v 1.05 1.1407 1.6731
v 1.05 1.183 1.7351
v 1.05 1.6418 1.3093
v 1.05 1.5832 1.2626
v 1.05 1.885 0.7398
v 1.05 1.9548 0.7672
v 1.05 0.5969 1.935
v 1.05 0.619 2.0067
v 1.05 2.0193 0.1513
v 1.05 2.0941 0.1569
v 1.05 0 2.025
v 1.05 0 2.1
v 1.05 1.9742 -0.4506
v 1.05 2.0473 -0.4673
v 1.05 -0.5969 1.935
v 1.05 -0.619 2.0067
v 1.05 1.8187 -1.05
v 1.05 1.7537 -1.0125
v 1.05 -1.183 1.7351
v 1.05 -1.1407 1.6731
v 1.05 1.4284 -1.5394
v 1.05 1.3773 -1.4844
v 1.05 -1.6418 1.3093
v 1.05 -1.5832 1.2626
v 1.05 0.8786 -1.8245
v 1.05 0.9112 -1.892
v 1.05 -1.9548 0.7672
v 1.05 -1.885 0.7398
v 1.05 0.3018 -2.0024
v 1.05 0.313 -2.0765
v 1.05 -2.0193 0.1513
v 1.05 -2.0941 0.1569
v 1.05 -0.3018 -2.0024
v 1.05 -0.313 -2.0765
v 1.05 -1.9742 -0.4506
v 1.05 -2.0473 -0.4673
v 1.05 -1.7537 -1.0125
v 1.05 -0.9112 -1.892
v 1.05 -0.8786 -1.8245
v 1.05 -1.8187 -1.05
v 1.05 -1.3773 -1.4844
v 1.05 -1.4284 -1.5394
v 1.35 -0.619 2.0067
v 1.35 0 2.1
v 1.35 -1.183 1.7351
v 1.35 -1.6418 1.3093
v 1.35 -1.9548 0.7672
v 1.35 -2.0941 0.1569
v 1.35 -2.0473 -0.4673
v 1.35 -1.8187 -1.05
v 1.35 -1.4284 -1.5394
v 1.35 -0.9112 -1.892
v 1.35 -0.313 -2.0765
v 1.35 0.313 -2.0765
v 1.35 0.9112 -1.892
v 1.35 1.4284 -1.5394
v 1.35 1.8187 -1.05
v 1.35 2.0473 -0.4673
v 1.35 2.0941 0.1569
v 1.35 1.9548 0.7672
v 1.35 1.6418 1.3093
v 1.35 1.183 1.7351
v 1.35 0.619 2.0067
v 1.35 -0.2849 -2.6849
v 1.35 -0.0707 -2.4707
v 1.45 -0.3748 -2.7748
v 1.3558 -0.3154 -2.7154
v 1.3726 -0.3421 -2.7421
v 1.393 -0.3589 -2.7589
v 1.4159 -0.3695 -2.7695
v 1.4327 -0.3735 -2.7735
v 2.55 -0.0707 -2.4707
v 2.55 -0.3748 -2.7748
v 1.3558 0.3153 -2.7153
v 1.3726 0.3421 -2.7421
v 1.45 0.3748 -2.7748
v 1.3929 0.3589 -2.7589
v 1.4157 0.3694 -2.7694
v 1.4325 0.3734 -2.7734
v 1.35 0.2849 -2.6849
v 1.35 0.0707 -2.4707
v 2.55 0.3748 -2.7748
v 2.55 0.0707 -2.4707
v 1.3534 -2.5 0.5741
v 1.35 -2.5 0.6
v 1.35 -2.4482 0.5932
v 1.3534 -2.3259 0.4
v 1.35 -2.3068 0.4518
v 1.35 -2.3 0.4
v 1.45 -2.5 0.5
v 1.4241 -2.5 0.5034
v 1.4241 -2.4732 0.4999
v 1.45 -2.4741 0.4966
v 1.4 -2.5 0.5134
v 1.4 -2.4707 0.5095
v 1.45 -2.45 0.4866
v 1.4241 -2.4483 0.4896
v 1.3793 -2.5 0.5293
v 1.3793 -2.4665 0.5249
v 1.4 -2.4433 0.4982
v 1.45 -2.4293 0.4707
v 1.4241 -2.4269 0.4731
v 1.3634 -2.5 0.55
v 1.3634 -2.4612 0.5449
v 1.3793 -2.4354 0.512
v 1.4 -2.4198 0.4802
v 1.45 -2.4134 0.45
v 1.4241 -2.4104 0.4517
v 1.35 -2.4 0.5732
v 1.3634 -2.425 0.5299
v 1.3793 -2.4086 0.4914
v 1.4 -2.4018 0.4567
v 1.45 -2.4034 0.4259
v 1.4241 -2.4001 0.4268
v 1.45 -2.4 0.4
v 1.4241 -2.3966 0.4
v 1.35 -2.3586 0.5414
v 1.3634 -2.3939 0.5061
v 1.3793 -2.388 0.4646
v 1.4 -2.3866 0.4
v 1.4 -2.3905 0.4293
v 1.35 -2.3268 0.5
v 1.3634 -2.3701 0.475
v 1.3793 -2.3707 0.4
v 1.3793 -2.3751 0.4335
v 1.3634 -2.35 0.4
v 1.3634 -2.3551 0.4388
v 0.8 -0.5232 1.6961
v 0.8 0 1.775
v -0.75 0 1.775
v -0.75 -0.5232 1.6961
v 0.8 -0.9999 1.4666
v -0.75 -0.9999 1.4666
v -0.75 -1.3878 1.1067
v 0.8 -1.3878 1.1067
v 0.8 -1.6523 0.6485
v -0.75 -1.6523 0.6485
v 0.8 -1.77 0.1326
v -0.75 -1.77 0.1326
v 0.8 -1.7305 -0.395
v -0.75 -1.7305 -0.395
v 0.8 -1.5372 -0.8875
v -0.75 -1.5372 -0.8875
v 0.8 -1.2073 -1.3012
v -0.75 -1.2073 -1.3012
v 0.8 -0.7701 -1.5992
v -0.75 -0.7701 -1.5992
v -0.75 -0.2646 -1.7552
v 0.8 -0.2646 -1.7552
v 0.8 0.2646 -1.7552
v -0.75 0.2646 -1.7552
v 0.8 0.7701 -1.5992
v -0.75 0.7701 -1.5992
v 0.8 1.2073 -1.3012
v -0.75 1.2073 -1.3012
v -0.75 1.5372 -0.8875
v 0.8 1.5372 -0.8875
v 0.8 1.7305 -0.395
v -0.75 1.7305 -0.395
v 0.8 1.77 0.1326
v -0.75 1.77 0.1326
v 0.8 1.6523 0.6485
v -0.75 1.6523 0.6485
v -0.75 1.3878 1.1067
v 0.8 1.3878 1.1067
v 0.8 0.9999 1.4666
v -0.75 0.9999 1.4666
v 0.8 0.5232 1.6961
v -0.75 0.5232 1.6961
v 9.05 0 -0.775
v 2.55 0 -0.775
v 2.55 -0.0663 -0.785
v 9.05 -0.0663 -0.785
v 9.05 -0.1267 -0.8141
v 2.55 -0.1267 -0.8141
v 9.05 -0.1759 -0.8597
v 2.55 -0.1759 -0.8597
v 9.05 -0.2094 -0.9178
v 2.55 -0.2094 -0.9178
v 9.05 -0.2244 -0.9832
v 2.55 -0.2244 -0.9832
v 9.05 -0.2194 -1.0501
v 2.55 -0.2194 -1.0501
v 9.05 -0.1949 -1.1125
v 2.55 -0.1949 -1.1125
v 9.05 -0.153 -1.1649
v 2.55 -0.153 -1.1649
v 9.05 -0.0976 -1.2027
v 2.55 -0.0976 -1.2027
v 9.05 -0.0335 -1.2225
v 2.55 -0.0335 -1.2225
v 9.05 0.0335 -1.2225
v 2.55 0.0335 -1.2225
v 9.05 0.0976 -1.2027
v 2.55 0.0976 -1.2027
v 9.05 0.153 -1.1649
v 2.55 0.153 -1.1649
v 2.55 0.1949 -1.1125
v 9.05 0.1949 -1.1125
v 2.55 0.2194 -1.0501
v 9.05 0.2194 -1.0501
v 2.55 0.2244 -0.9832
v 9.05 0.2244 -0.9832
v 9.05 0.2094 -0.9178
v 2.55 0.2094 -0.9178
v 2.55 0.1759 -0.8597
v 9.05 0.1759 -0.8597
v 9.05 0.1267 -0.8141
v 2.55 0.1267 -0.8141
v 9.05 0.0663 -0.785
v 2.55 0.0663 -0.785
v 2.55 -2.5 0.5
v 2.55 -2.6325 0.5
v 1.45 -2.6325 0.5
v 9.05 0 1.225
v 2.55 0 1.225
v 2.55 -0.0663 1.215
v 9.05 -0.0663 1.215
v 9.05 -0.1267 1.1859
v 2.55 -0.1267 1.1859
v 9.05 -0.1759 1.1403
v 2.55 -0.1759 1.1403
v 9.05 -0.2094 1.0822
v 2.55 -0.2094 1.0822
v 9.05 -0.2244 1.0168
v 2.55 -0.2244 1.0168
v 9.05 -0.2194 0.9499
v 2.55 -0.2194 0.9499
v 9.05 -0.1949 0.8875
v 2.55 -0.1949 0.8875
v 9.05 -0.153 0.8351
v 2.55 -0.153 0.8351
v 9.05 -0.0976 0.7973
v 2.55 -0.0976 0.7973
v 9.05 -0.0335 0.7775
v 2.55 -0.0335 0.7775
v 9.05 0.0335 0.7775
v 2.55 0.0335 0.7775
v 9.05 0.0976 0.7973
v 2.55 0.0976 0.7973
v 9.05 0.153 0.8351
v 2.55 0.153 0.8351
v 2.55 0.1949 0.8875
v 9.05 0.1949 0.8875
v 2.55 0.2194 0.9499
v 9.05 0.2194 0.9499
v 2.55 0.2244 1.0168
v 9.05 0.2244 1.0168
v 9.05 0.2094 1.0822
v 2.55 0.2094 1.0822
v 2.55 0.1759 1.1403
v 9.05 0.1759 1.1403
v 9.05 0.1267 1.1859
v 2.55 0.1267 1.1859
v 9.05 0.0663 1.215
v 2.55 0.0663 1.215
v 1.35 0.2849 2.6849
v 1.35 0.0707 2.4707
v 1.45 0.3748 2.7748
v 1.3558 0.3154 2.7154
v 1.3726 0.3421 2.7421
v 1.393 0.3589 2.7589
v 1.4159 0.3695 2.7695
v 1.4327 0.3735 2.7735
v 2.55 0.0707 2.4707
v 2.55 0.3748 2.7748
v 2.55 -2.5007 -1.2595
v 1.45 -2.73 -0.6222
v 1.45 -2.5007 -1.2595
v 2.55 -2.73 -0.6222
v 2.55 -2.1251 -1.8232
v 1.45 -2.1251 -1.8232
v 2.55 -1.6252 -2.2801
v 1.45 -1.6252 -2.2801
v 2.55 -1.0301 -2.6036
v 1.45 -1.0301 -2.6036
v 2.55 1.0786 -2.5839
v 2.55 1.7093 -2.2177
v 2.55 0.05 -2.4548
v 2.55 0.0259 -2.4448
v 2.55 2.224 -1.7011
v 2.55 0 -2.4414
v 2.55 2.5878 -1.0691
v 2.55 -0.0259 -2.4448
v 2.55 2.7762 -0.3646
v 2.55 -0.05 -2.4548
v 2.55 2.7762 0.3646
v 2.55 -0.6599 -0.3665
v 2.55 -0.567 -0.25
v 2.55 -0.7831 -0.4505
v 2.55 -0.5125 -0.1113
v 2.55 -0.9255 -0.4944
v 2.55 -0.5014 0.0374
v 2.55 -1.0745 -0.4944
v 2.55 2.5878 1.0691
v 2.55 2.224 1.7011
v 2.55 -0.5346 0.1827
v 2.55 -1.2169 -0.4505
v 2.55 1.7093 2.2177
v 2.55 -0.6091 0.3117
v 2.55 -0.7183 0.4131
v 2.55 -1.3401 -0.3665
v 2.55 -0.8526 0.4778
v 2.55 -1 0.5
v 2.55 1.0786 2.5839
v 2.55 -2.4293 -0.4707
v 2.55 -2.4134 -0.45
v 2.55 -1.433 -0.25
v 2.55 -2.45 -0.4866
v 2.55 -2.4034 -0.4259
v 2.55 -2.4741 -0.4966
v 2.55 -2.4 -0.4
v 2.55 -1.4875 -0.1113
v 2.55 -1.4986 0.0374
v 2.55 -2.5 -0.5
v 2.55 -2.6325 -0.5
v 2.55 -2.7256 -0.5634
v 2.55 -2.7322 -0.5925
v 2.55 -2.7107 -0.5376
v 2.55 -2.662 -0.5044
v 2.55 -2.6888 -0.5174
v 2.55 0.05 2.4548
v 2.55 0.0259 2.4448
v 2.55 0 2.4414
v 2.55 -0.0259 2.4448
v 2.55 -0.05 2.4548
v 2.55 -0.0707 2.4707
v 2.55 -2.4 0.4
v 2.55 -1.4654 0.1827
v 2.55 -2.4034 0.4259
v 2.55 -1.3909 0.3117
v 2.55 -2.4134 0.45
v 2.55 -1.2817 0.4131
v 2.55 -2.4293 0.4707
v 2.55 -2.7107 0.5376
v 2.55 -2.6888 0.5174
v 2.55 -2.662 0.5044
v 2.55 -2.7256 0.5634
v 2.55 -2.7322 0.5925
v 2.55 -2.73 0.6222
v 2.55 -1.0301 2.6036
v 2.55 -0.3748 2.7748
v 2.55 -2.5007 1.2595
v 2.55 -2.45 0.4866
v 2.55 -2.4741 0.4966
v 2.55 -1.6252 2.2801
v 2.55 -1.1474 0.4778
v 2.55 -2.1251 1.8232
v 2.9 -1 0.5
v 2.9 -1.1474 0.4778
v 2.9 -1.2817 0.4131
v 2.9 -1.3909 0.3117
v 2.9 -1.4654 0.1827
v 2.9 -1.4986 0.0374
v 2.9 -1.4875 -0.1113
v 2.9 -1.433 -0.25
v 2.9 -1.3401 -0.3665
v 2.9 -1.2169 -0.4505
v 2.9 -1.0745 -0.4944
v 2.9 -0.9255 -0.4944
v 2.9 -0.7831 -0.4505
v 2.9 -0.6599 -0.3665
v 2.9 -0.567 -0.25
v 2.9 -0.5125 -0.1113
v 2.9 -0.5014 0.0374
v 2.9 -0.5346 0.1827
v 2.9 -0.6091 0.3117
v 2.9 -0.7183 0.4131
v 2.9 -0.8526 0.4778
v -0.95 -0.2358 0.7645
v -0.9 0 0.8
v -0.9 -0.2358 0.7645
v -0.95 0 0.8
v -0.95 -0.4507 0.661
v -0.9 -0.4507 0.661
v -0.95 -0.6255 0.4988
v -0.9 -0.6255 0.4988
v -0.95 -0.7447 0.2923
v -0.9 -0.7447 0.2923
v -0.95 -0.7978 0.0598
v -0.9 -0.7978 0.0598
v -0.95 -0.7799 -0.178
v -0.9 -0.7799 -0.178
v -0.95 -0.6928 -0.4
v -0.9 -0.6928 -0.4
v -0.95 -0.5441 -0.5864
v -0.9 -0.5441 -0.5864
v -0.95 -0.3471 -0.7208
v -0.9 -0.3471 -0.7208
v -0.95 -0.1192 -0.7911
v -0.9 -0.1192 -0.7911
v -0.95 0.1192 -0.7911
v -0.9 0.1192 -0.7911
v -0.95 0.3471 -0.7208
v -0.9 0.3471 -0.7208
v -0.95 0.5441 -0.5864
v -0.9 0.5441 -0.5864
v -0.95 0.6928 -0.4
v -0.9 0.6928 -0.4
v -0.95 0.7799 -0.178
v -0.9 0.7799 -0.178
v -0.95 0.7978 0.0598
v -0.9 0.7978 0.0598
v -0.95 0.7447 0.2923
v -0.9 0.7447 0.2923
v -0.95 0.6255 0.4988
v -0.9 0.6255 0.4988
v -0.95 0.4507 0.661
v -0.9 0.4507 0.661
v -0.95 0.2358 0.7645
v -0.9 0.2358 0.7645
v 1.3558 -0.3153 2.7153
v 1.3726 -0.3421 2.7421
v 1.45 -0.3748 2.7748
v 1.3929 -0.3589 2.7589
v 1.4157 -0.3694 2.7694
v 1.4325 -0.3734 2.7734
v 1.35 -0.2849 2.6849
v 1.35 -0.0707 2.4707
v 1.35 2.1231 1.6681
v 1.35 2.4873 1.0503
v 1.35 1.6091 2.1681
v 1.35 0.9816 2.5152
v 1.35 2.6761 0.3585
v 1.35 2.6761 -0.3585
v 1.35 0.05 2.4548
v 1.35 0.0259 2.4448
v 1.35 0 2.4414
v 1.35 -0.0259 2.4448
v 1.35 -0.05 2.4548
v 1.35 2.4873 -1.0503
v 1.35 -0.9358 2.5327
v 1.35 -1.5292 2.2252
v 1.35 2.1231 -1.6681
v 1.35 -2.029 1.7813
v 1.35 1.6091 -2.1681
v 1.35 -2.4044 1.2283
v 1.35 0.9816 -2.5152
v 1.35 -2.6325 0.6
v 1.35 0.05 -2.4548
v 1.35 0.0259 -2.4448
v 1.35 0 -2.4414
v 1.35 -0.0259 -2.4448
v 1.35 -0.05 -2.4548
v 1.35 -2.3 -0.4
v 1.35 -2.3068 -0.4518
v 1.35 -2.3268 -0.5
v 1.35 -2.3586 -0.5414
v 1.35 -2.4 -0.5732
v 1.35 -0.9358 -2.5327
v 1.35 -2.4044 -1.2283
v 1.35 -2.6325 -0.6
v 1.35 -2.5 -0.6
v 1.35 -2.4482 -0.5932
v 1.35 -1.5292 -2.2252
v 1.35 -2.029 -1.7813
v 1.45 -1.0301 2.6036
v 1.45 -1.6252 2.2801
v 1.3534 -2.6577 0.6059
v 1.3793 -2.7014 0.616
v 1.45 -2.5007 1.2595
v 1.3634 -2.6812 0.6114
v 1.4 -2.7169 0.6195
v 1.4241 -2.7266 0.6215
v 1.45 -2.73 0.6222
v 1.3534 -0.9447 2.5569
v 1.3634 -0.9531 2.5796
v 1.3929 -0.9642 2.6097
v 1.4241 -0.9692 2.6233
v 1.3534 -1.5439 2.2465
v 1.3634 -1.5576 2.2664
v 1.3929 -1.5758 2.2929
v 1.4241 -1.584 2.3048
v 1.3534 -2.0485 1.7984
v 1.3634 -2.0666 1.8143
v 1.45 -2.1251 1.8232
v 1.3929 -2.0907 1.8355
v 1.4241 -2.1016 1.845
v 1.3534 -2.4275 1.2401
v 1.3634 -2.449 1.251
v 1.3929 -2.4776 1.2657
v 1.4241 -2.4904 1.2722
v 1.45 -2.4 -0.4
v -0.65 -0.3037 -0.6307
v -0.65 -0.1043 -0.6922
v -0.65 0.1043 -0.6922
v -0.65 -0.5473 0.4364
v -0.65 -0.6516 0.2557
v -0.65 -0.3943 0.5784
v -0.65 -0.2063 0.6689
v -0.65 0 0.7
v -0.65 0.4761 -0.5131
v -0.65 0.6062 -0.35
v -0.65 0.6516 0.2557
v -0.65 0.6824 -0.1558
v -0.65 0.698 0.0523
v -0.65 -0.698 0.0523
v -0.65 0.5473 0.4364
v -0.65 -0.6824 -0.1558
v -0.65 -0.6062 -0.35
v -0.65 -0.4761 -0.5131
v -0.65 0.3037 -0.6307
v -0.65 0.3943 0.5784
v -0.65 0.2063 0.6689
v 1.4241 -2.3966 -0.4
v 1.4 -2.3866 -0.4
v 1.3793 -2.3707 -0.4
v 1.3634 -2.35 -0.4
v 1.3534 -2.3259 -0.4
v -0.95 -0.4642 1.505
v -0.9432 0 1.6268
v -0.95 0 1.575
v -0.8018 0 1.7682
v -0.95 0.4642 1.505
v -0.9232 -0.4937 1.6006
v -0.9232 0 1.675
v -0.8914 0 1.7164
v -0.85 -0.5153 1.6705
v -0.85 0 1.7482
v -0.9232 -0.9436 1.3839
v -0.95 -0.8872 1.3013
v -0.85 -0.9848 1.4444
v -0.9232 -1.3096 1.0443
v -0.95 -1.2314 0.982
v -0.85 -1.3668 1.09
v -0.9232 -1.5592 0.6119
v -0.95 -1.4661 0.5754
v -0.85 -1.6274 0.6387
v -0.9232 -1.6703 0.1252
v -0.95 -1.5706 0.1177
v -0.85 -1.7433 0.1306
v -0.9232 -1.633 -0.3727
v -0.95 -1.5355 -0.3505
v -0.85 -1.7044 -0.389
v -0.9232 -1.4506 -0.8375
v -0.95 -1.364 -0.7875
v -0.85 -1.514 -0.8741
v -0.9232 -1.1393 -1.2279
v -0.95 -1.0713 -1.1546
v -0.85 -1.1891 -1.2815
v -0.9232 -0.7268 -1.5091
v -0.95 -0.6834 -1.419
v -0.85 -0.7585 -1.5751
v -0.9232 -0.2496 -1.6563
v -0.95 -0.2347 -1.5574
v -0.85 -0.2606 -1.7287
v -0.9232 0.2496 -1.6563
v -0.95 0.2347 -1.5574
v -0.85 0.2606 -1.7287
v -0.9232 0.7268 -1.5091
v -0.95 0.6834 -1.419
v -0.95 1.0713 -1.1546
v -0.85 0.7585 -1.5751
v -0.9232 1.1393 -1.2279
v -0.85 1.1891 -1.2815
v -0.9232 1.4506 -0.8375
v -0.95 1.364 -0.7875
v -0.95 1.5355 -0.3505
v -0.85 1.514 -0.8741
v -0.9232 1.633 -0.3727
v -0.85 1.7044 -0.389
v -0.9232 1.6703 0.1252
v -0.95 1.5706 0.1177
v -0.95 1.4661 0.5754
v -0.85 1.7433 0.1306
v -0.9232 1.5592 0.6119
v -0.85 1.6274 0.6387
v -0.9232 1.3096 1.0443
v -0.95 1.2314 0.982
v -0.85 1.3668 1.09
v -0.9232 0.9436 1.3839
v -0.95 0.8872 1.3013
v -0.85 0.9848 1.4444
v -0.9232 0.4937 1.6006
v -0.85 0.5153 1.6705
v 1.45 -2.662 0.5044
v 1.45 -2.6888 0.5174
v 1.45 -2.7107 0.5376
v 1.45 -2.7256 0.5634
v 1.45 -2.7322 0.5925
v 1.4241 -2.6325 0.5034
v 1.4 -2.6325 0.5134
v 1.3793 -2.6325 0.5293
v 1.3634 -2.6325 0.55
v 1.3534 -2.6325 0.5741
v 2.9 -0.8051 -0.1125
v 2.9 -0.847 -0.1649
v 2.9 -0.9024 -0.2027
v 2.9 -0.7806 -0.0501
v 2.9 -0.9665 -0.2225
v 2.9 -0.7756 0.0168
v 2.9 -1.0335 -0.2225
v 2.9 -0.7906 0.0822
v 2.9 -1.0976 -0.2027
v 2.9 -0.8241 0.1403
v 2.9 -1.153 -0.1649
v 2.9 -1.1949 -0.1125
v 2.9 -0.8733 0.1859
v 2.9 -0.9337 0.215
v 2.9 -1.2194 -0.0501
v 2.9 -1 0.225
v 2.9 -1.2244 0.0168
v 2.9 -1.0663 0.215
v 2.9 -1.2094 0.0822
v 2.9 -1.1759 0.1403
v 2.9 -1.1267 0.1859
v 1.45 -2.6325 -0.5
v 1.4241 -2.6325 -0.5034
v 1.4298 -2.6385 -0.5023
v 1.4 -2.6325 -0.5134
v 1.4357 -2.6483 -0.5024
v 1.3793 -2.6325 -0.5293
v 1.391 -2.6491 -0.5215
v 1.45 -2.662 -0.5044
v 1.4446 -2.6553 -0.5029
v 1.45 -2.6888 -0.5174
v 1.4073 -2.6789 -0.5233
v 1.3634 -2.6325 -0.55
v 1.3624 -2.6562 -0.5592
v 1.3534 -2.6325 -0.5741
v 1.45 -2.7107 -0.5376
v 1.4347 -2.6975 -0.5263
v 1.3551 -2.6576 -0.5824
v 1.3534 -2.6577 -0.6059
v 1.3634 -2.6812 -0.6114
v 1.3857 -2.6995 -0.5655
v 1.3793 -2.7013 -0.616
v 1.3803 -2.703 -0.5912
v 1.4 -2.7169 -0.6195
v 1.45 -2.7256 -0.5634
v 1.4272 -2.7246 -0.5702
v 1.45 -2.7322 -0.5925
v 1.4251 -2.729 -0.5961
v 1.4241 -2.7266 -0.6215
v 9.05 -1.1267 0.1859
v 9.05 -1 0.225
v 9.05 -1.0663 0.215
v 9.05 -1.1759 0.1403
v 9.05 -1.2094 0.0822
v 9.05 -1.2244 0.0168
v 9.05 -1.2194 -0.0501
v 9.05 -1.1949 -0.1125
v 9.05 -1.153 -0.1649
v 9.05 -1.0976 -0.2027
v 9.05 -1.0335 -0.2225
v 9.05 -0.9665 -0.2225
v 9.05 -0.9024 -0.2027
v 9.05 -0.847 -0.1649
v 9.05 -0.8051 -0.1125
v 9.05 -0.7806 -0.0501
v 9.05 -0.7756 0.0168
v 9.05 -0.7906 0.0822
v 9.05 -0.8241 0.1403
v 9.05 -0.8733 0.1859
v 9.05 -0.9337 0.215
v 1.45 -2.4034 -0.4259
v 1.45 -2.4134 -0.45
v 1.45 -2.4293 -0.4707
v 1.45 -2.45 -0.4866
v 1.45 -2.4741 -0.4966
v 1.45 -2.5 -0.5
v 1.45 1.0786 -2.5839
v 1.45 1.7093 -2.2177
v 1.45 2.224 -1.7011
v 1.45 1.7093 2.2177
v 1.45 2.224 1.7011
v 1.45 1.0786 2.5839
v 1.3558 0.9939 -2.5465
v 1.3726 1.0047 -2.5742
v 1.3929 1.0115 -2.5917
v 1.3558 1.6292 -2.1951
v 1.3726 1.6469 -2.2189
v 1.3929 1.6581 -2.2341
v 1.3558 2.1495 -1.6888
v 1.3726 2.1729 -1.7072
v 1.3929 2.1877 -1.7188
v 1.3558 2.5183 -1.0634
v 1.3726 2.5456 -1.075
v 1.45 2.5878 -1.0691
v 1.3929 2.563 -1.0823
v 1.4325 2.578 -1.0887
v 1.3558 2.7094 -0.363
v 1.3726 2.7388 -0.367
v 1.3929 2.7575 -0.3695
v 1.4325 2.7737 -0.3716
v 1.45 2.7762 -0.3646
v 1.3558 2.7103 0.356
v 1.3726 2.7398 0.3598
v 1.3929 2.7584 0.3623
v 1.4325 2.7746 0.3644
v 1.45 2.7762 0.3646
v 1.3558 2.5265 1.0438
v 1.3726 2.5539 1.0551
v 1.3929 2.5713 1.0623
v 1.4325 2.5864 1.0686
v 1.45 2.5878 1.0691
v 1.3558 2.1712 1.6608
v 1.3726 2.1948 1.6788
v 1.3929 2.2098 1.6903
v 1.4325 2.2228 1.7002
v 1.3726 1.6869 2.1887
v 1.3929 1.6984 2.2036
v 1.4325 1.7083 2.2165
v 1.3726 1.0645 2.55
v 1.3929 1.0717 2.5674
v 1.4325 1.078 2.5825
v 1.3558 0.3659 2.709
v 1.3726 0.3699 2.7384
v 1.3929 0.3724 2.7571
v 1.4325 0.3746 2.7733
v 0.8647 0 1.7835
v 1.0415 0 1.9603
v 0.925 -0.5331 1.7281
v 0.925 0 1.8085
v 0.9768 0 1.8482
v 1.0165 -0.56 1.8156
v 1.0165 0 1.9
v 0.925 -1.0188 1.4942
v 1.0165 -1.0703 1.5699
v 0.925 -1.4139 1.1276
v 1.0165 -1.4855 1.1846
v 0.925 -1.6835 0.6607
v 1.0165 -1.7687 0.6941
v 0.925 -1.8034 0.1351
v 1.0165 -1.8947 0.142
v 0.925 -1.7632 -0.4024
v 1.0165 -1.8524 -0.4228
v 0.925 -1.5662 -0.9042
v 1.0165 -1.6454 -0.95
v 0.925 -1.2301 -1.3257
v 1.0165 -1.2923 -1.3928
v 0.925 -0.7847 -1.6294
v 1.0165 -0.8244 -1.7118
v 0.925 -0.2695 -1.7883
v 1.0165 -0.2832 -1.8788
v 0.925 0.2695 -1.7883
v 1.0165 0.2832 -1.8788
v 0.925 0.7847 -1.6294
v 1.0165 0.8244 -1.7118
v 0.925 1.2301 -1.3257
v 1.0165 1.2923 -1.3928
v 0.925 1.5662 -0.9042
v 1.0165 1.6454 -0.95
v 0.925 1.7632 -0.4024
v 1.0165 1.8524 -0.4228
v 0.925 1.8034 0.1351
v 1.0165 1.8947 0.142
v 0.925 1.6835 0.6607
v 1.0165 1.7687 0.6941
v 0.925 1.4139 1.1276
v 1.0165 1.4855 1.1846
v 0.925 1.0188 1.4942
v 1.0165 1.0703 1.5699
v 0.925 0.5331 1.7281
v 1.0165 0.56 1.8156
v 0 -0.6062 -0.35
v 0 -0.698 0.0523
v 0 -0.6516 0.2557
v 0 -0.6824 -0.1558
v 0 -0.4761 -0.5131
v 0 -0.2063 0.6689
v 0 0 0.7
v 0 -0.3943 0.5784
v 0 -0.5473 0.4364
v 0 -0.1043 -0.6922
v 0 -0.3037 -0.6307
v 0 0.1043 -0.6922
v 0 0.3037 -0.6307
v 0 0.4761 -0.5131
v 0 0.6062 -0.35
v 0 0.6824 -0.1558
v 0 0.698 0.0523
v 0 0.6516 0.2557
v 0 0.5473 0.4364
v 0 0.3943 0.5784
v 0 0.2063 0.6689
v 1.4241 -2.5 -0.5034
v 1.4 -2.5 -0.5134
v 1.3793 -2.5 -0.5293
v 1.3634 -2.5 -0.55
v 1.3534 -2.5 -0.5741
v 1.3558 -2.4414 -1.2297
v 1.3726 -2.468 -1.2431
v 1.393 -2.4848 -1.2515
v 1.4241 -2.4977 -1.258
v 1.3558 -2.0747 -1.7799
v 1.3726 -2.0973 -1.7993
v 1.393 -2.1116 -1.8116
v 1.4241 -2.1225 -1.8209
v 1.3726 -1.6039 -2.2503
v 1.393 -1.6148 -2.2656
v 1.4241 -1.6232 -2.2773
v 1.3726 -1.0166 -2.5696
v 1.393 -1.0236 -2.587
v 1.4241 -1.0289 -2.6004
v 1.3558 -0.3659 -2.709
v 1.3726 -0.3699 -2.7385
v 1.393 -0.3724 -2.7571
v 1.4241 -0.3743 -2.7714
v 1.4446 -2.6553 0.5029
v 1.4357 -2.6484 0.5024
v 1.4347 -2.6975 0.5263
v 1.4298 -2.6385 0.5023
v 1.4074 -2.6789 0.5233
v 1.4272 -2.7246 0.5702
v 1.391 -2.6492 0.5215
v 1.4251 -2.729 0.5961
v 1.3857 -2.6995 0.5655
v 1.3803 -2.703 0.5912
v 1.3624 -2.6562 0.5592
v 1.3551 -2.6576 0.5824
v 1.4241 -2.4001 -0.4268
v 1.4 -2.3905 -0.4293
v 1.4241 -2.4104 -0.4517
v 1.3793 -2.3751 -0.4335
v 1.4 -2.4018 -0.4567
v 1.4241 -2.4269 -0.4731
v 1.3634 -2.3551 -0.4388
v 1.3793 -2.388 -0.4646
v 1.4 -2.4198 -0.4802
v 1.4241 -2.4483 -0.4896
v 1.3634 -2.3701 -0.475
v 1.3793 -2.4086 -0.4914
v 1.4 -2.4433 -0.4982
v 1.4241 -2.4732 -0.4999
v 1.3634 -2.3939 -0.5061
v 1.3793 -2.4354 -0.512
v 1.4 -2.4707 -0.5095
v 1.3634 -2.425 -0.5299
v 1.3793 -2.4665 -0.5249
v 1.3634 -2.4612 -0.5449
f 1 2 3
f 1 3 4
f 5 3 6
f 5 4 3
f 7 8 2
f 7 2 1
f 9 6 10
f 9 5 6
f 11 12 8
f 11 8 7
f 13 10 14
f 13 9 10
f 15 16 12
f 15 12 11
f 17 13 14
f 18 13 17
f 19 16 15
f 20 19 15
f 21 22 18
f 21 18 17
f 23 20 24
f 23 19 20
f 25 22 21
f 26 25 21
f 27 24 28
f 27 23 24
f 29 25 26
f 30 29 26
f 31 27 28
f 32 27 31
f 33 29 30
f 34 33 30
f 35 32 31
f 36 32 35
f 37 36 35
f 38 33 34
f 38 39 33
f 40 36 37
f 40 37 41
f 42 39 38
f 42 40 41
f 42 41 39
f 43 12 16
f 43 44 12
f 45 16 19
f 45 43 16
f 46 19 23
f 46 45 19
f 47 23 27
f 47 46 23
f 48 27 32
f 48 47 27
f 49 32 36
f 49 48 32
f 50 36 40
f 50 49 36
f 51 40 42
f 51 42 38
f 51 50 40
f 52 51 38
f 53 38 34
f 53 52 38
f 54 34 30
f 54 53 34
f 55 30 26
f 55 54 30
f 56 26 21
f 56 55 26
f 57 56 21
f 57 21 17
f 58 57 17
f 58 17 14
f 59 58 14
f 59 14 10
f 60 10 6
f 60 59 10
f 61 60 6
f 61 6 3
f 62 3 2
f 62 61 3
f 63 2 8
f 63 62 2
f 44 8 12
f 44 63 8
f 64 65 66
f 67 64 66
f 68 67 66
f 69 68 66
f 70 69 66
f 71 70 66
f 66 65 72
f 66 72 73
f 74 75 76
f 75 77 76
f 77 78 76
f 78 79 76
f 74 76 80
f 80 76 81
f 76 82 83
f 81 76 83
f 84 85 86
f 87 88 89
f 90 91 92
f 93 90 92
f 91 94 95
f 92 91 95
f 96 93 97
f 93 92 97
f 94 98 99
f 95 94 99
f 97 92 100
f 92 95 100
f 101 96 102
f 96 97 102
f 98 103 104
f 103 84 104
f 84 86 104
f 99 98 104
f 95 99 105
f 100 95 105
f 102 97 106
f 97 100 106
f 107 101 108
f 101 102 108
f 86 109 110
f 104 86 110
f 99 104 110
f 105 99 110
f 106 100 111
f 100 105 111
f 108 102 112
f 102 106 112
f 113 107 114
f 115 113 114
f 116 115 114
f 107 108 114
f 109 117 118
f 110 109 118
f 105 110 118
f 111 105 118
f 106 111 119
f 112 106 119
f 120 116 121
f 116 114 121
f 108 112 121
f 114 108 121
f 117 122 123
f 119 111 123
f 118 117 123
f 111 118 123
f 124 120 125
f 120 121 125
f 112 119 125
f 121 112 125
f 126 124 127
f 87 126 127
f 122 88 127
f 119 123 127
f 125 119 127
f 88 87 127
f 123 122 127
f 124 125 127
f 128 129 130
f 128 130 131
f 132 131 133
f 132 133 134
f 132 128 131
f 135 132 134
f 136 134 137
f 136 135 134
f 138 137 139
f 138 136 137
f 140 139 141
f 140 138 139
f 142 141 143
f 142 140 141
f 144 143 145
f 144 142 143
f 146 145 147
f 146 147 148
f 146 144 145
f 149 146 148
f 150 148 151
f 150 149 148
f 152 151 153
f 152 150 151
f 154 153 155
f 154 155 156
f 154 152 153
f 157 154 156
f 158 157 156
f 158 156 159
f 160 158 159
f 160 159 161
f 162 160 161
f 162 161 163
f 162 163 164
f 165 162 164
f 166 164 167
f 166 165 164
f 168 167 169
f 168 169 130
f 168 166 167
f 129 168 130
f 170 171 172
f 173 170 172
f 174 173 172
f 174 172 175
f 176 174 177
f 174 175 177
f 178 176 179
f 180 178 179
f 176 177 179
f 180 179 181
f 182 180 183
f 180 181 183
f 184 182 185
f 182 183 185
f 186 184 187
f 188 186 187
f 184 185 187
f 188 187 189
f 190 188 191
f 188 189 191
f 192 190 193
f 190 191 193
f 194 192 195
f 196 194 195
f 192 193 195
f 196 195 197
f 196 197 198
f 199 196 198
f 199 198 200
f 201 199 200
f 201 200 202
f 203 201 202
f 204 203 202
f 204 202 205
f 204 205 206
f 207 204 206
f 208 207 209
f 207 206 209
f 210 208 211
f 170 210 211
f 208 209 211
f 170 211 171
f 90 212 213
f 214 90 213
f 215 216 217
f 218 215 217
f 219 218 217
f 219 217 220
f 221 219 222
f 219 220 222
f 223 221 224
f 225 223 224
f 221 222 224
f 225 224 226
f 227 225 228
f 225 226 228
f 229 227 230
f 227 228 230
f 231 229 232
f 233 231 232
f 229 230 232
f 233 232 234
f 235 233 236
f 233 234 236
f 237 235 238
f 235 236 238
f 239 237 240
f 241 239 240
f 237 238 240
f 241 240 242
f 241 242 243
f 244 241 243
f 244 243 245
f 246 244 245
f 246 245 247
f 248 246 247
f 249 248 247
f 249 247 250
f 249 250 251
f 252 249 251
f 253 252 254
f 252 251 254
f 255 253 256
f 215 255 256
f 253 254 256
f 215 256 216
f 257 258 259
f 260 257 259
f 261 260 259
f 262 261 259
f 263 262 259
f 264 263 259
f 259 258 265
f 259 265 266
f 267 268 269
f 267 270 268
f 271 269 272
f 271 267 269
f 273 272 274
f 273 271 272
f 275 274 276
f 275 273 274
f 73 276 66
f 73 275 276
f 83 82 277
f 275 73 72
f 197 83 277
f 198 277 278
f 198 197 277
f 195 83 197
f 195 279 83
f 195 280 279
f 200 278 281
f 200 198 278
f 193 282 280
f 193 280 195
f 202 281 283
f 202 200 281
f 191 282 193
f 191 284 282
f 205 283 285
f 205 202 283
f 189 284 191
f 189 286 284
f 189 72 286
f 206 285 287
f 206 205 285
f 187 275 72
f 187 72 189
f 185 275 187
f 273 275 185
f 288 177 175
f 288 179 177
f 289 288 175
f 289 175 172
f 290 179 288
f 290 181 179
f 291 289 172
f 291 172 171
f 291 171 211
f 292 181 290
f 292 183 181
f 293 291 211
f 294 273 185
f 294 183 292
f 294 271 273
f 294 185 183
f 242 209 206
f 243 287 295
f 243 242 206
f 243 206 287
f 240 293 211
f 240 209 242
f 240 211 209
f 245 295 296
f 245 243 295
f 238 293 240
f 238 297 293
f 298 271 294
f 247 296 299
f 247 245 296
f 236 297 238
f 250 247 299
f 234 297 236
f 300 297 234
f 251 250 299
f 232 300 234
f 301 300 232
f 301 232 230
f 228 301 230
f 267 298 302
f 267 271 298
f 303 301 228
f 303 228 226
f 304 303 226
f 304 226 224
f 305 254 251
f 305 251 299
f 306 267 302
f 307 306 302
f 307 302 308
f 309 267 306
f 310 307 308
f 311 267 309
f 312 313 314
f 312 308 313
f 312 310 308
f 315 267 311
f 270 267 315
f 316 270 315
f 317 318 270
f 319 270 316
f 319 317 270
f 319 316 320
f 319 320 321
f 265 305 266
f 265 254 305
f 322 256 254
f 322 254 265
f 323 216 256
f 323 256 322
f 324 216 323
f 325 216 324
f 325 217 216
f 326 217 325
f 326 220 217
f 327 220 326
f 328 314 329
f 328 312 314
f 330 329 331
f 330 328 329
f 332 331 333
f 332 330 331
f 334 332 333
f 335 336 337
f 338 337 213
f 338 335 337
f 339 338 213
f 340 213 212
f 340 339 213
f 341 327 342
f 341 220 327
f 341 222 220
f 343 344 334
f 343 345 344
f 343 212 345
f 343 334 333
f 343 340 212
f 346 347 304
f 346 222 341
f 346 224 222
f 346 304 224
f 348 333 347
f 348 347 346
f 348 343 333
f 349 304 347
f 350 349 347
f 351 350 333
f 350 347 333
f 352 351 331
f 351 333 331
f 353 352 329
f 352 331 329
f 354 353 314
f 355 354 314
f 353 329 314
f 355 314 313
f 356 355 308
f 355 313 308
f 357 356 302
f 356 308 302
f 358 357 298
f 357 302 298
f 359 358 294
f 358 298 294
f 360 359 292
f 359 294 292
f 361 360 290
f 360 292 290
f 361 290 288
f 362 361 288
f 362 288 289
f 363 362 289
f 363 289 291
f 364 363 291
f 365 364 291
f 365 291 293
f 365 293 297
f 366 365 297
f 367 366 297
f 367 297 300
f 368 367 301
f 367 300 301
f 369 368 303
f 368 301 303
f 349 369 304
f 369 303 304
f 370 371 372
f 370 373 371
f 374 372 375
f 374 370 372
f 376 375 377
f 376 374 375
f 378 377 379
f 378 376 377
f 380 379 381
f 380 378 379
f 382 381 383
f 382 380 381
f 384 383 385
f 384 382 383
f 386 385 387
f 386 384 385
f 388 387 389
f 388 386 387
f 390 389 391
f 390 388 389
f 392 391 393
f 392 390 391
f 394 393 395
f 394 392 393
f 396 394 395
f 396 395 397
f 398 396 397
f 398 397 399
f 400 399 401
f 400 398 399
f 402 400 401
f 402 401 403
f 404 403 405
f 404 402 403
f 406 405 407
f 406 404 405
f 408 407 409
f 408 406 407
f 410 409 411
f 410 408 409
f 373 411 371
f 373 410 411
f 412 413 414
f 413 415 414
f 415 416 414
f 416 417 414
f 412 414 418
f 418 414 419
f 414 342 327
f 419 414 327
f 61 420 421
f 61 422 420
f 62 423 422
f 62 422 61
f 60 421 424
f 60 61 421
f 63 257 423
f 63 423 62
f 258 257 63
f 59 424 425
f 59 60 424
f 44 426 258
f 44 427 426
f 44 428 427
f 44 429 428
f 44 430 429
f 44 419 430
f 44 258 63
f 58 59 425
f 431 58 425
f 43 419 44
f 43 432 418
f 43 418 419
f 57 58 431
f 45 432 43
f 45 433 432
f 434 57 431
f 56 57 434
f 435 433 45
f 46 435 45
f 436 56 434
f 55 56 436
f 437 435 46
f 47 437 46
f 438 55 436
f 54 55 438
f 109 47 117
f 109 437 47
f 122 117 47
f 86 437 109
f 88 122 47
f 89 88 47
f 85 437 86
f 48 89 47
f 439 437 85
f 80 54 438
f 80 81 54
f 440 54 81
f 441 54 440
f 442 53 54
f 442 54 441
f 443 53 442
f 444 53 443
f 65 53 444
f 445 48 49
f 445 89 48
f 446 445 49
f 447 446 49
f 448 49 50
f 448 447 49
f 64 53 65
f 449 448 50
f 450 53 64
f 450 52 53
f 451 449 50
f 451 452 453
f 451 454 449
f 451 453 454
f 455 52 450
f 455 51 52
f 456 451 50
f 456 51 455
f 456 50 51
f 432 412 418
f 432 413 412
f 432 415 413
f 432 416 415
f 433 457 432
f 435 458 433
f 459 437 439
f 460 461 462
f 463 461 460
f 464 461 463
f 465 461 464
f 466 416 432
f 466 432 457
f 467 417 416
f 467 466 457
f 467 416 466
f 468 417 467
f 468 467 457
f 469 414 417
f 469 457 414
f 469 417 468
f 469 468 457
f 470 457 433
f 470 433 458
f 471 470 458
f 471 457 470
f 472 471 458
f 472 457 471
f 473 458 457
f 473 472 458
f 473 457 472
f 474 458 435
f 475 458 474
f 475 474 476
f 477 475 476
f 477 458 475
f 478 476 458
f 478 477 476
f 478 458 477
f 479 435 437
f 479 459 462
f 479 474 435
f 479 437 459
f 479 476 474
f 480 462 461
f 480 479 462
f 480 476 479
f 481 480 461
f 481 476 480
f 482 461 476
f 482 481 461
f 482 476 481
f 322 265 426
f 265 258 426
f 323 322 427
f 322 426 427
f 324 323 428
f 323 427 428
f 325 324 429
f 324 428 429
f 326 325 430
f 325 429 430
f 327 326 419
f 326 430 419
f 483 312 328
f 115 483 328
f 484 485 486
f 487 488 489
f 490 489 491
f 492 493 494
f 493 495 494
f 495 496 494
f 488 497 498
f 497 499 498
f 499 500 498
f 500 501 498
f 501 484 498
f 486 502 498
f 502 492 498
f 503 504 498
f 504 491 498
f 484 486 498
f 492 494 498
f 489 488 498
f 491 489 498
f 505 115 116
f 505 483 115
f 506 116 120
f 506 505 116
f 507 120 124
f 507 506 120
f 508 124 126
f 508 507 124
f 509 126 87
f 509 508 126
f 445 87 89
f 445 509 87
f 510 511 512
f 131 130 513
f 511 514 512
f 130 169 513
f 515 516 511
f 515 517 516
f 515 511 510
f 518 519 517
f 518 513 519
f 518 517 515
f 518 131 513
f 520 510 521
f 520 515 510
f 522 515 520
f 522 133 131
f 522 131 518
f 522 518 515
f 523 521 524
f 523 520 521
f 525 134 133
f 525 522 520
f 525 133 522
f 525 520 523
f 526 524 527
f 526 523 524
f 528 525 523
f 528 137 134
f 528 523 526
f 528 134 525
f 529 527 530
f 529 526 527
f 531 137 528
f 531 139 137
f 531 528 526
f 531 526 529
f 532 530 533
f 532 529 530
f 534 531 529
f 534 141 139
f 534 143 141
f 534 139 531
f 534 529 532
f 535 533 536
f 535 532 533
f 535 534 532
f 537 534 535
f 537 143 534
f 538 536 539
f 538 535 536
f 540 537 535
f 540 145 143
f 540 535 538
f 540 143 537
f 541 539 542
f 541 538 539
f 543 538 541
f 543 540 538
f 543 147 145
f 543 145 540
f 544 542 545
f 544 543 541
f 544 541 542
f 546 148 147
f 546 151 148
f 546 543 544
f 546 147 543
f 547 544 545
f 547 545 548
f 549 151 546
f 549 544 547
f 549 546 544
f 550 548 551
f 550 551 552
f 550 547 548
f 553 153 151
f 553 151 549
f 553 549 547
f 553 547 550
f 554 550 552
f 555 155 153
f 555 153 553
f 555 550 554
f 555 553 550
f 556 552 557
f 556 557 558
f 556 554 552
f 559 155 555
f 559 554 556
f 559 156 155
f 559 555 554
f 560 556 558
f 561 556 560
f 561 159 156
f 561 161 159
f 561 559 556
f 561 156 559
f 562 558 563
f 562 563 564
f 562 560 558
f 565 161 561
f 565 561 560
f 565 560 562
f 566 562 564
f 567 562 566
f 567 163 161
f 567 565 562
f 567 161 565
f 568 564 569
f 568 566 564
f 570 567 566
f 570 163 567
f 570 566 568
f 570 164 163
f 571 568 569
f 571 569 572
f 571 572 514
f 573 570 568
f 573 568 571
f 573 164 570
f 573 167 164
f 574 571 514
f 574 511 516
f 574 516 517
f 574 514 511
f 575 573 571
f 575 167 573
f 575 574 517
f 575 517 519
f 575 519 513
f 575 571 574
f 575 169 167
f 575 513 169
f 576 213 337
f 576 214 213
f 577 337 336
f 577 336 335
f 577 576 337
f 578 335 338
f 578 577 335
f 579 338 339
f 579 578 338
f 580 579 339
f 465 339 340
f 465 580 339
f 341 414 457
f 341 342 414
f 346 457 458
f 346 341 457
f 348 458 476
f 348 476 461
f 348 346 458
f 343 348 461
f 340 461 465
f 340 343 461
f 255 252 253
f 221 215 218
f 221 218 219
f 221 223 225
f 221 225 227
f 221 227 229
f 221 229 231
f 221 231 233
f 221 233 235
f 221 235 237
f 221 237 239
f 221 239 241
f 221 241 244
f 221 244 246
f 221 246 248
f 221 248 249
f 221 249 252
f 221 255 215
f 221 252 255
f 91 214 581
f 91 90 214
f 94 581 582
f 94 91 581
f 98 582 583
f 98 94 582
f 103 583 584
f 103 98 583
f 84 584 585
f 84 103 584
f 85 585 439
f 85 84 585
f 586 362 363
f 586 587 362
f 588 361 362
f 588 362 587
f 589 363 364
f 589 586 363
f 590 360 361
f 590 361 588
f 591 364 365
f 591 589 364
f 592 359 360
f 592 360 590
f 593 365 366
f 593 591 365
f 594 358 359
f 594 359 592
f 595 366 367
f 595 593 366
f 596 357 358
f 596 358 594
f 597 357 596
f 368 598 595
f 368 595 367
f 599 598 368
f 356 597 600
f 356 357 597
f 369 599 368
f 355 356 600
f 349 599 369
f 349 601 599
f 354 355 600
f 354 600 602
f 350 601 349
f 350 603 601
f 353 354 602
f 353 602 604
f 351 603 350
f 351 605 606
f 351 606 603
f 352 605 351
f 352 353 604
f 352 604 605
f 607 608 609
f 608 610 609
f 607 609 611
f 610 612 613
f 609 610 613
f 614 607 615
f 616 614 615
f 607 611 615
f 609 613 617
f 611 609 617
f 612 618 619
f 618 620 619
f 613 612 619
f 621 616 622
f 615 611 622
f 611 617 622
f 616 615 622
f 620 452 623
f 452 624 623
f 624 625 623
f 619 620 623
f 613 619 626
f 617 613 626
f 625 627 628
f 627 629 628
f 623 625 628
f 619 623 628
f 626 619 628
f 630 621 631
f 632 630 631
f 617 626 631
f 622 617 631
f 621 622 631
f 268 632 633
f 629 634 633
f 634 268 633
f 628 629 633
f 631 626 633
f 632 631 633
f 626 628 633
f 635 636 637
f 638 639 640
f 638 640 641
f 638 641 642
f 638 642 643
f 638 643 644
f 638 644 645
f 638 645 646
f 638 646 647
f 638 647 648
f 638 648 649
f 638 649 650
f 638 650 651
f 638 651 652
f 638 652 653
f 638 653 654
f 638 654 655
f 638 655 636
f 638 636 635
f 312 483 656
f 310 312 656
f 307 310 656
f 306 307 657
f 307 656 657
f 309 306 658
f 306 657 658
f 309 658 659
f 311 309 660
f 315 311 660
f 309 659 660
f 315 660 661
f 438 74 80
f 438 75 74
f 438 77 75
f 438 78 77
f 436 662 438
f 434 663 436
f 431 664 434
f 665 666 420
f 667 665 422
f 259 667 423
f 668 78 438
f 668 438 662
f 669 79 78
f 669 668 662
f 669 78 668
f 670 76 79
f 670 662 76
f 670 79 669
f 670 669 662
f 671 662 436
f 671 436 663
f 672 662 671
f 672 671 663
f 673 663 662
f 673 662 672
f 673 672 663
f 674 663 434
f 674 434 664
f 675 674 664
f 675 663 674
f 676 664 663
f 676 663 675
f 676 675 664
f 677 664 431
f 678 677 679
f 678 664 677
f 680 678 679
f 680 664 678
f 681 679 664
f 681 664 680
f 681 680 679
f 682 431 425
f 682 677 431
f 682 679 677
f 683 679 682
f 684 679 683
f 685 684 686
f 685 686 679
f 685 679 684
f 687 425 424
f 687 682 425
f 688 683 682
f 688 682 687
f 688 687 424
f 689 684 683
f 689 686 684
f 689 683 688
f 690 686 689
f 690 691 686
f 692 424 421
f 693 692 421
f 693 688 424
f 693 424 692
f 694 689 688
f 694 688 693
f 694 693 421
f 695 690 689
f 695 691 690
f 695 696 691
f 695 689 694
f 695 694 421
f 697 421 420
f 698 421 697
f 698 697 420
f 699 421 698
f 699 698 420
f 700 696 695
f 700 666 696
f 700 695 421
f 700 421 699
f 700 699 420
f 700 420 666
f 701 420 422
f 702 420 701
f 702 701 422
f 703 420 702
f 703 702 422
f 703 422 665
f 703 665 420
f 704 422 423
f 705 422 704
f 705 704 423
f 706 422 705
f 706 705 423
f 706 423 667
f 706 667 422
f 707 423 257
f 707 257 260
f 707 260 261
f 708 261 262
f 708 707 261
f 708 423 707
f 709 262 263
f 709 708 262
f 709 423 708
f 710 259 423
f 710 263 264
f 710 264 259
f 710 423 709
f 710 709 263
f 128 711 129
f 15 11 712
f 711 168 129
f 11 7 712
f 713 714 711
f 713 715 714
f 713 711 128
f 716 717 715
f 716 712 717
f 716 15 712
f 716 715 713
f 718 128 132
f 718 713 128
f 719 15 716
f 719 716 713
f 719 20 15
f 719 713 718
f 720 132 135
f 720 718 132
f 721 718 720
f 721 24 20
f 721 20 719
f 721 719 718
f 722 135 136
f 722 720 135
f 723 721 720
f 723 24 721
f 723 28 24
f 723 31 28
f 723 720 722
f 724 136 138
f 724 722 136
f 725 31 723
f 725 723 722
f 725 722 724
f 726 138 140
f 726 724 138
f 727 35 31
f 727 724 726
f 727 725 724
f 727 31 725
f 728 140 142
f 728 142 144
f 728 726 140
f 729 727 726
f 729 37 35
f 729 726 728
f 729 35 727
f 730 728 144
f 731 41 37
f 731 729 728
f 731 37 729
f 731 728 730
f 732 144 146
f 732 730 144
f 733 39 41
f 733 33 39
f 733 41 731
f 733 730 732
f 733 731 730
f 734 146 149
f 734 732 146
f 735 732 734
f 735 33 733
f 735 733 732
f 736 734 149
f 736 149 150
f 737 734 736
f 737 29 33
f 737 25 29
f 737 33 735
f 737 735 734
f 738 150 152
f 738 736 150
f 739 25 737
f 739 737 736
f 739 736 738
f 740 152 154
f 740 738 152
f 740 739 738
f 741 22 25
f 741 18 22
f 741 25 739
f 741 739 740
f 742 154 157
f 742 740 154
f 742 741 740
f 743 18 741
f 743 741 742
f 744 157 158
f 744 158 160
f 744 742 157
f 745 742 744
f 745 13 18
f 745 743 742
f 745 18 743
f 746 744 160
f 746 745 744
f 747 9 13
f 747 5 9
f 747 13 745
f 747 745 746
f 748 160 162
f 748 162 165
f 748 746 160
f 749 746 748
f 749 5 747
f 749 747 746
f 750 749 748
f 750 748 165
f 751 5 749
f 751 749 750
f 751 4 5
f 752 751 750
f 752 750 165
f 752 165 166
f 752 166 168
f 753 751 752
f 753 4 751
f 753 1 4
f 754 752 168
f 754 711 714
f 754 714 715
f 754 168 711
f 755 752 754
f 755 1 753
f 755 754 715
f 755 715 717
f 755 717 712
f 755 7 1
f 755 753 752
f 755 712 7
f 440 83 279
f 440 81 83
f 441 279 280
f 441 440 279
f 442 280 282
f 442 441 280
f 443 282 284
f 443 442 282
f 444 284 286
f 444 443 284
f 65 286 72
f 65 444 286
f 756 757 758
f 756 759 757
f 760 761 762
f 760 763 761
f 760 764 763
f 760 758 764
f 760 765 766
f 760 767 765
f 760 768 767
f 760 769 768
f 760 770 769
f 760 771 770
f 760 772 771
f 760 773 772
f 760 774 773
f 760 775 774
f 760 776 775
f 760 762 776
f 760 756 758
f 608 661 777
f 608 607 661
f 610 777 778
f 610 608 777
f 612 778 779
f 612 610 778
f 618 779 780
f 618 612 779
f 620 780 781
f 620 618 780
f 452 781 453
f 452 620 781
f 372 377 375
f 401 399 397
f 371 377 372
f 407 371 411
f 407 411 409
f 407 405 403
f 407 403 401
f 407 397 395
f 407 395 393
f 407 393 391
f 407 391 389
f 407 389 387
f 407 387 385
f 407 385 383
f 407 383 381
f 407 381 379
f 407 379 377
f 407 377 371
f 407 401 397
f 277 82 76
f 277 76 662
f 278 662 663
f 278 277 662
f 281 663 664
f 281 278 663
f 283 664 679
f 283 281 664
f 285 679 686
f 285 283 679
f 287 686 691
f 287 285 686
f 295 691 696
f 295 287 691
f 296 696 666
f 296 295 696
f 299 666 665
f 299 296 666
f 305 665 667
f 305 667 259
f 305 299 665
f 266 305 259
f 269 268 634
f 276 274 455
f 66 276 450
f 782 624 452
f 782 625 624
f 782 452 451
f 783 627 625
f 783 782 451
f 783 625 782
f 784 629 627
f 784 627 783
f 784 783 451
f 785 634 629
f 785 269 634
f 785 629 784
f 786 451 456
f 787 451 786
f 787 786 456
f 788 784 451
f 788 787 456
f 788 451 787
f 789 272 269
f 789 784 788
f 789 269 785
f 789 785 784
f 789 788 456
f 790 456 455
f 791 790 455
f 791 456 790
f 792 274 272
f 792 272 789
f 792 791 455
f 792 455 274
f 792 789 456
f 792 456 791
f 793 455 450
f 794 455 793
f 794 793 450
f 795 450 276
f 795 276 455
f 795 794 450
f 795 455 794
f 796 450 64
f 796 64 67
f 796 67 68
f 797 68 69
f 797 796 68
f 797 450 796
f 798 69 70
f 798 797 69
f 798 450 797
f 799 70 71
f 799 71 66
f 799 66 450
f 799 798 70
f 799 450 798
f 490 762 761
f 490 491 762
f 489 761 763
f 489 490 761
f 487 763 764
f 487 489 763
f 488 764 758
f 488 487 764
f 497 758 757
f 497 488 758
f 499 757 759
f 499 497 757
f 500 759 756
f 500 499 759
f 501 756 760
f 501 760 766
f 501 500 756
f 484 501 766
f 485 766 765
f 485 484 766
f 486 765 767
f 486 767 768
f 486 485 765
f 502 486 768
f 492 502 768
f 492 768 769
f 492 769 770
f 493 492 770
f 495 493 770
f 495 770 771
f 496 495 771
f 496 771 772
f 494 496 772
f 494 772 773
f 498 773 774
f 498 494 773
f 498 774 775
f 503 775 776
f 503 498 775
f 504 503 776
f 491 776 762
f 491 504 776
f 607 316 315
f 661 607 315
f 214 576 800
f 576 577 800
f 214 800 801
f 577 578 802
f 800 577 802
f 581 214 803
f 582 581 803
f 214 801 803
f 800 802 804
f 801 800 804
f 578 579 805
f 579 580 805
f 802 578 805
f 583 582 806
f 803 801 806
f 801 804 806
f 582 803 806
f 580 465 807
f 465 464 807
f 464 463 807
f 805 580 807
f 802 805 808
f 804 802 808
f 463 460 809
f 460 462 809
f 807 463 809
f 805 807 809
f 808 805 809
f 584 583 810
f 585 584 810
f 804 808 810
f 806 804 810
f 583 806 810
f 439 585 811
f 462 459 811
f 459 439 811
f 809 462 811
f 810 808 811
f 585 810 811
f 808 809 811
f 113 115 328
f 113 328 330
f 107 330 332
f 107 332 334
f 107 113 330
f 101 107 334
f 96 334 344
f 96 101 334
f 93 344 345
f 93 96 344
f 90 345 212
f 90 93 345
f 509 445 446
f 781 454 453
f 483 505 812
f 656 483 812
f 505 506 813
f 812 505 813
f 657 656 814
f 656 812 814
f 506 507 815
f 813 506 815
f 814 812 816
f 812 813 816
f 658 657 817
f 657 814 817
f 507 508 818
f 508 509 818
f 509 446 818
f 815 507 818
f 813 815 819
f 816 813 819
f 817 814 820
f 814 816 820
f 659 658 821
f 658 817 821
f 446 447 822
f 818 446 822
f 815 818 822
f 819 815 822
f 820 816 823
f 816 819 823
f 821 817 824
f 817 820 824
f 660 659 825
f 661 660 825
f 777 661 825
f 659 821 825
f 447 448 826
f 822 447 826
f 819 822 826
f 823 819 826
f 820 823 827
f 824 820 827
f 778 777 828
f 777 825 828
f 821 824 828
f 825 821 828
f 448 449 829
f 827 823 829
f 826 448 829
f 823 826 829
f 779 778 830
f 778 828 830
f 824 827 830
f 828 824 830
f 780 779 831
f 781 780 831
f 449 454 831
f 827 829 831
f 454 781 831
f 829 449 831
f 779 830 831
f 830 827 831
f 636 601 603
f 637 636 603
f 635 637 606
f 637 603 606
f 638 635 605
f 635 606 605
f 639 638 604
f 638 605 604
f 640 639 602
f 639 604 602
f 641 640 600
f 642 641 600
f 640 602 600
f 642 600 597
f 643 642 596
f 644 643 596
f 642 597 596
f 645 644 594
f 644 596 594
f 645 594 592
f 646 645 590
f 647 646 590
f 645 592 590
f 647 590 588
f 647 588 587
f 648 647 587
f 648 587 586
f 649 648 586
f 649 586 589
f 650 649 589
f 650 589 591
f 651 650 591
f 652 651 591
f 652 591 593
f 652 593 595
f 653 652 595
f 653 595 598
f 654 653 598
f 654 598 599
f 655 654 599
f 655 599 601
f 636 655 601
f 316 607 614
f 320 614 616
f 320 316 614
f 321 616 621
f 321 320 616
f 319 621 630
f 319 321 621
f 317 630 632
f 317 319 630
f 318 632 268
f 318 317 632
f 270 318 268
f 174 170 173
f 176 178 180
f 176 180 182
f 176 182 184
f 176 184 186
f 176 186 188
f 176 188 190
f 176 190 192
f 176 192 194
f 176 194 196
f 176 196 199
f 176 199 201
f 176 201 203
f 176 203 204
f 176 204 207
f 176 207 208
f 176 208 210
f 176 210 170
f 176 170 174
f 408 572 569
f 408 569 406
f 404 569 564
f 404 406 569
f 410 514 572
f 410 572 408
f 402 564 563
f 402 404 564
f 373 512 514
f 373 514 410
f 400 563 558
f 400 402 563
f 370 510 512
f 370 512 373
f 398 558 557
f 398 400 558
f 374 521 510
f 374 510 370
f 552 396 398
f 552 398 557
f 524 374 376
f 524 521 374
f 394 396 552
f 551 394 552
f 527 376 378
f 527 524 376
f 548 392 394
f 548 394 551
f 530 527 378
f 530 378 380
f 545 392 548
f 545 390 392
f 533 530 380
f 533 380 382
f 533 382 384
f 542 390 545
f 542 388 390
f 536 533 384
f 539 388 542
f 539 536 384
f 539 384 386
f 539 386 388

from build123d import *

# Parameters (mm, degrees)
SKETCH6_R           = 0.225
EXTRUDE2_DEPTH      = 6.5
CUT_EXTRUDE1_DEPTH  = 8.611175993
BOSS_EXTRUDE1_START = 0.25
SKETCH10_R          = 0.8
BOSS_EXTRUDE1_DEPTH = 0.25
FILLET1_R           = 0.2
FILLET2_R           = 0.1
SKETCH6_3_R         = 0.5
SKETCH6_3_R_2       = 0.225
BOSS_EXTRUDE2_DEPTH = 0.35
FILLET4_R           = 0.1
FILLET5_R           = 0.1
FILLET6_R           = 0.1
FILLET7_R           = 0.1
FILLET8_R           = 0.1


with BuildPart() as part:
    # Sketch4 → Revolve2 (revolve)
    with BuildSketch(Plane.XY):
        with BuildLine():
            Line((0, 0), (0, 0.7))
            Line((0, 0.7), (-0.65, 0.7))
            Line((-0.65, 0.7), (-0.65, 0.8))
            Line((-0.65, 0.8), (-0.95, 0.8))
            Line((-0.95, 0.8), (-0.95, 1.775))
            Line((-0.95, 1.775), (0.8, 1.775))
            ThreePointArc((0.8, 1.775), (0.976776695, 1.848223305), (1.05, 2.025))
            Line((1.05, 2.025), (1.05, 2.1))
            Line((1.05, 2.1), (1.35, 2.1))
            Line((1.35, 2.1), (1.35, 2.8))
            Line((1.35, 2.8), (2.55, 2.8))
            Line((2.55, 2.8), (2.55, 0))
            Line((2.55, 0), (0, 0))
        make_face()
    revolve(axis=Axis((-2.49171246, 0, 0), (1, 0, 0)))

    # Sketch6 → Extrude2 (add)
    with BuildSketch(Plane(origin=(2.55, 0, 0), x_dir=(0, 0, -1), z_dir=(1, 0, 0))):
        with Locations((1, 0)):
            Circle(SKETCH6_R)
        with Locations((0, -1)):
            Circle(SKETCH6_R)
        with Locations((-1, 0)):
            Circle(SKETCH6_R)
    extrude(amount=EXTRUDE2_DEPTH)

    # Sketch8 → Cut-Extrude1 (cut, through all)
    with BuildSketch(Plane(origin=(2.55, 0, 0), x_dir=(0, 0, -1), z_dir=(1, 0, 0))):
        with BuildLine():
            Line((2.774801575, 0.374801575), (2.4, 0))
            Line((2.4, 0), (2.774801575, -0.374801575))
            ThreePointArc((2.774801575, -0.374801575), (2.8, 0), (2.774801575, 0.374801575))
        make_face()
        with BuildLine():
            Line((-2.4, 0), (-2.774801575, 0.374801575))
            ThreePointArc((-2.774801575, 0.374801575), (-2.8, 0), (-2.774801575, -0.374801575))
            Line((-2.774801575, -0.374801575), (-2.4, 0))
        make_face()
        with BuildLine():
            ThreePointArc((-0.5, -2.754995463), (0, -2.8), (0.5, -2.754995463))
            Line((0.5, -2.754995463), (0.5, -2.4))
            Line((0.5, -2.4), (-0.5, -2.4))
            Line((-0.5, -2.4), (-0.5, -2.754995463))
        make_face()
    extrude(amount=-CUT_EXTRUDE1_DEPTH, mode=Mode.SUBTRACT)

    # Sketch10 → Boss-Extrude1 (add)
    with BuildSketch(Plane.ZY.offset(0.65).offset(BOSS_EXTRUDE1_START)):
        Circle(SKETCH10_R)
    extrude(amount=-BOSS_EXTRUDE1_DEPTH)

    # Fillet1
    fillet1_edges = [part.edges().sort_by_distance(p)[0] for p in [
        (-0.95, -1.775, 0),
    ]]
    fillet(fillet1_edges, radius=FILLET1_R)

    # Fillet2
    fillet2_edges = [part.edges().sort_by_distance(p)[0] for p in [
        (1.35, -1.934576937, -2.02420653),
        (1.35, -1.934576937, 2.02420653),
        (1.35, 2.8, 0),
    ]]
    fillet(fillet2_edges, radius=FILLET2_R)

    # Sketch6<3> → Boss-Extrude2 (add)
    with BuildSketch(Plane(origin=(2.55, 0, 0), x_dir=(0, 0, -1), z_dir=(1, 0, 0))):
        with Locations((0, -1)):
            Circle(SKETCH6_3_R)
        with Locations((0, -1)):
            Circle(SKETCH6_3_R_2, mode=Mode.SUBTRACT)
    extrude(amount=BOSS_EXTRUDE2_DEPTH)

    # Fillet4
    fillet4_edges = [part.edges().sort_by_distance(p)[0] for p in [
        (1.95, -2.4, 0.5),
    ]]
    fillet(fillet4_edges, radius=FILLET4_R)

    # Fillet5
    fillet5_edges = [part.edges().sort_by_distance(p)[0] for p in [
        (1.95, -2.4, -0.5),
    ]]
    fillet(fillet5_edges, radius=FILLET5_R)

    # Fillet6
    fillet6_edges = [part.edges().sort_by_distance(p)[0] for p in [
        (2, -2.754995463, -0.5),
        (1.378931181, -2.724856522, -0.5),
        (1.35, -2.576649916, -0.5),
        (1.35, -2.429289322, -0.470710678),
        (1.35, -2.4, 0),
        (1.35, -2.429289322, 0.470710678),
        (1.35, -2.576649916, 0.5),
        (1.378985991, -2.724912772, 0.5),
        (2, -2.754995463, 0.5),
    ]]
    fillet(fillet6_edges, radius=FILLET6_R)

    # Fillet7
    fillet7_edges = [part.edges().sort_by_distance(p)[0] for p in [
        (1.95, 0, 2.4),
    ]]
    fillet(fillet7_edges, radius=FILLET7_R)

    # Fillet8
    fillet8_edges = [part.edges().sort_by_distance(p)[0] for p in [
        (1.95, 0, -2.4),
    ]]
    fillet(fillet8_edges, radius=FILLET8_R)


solid = part.part
